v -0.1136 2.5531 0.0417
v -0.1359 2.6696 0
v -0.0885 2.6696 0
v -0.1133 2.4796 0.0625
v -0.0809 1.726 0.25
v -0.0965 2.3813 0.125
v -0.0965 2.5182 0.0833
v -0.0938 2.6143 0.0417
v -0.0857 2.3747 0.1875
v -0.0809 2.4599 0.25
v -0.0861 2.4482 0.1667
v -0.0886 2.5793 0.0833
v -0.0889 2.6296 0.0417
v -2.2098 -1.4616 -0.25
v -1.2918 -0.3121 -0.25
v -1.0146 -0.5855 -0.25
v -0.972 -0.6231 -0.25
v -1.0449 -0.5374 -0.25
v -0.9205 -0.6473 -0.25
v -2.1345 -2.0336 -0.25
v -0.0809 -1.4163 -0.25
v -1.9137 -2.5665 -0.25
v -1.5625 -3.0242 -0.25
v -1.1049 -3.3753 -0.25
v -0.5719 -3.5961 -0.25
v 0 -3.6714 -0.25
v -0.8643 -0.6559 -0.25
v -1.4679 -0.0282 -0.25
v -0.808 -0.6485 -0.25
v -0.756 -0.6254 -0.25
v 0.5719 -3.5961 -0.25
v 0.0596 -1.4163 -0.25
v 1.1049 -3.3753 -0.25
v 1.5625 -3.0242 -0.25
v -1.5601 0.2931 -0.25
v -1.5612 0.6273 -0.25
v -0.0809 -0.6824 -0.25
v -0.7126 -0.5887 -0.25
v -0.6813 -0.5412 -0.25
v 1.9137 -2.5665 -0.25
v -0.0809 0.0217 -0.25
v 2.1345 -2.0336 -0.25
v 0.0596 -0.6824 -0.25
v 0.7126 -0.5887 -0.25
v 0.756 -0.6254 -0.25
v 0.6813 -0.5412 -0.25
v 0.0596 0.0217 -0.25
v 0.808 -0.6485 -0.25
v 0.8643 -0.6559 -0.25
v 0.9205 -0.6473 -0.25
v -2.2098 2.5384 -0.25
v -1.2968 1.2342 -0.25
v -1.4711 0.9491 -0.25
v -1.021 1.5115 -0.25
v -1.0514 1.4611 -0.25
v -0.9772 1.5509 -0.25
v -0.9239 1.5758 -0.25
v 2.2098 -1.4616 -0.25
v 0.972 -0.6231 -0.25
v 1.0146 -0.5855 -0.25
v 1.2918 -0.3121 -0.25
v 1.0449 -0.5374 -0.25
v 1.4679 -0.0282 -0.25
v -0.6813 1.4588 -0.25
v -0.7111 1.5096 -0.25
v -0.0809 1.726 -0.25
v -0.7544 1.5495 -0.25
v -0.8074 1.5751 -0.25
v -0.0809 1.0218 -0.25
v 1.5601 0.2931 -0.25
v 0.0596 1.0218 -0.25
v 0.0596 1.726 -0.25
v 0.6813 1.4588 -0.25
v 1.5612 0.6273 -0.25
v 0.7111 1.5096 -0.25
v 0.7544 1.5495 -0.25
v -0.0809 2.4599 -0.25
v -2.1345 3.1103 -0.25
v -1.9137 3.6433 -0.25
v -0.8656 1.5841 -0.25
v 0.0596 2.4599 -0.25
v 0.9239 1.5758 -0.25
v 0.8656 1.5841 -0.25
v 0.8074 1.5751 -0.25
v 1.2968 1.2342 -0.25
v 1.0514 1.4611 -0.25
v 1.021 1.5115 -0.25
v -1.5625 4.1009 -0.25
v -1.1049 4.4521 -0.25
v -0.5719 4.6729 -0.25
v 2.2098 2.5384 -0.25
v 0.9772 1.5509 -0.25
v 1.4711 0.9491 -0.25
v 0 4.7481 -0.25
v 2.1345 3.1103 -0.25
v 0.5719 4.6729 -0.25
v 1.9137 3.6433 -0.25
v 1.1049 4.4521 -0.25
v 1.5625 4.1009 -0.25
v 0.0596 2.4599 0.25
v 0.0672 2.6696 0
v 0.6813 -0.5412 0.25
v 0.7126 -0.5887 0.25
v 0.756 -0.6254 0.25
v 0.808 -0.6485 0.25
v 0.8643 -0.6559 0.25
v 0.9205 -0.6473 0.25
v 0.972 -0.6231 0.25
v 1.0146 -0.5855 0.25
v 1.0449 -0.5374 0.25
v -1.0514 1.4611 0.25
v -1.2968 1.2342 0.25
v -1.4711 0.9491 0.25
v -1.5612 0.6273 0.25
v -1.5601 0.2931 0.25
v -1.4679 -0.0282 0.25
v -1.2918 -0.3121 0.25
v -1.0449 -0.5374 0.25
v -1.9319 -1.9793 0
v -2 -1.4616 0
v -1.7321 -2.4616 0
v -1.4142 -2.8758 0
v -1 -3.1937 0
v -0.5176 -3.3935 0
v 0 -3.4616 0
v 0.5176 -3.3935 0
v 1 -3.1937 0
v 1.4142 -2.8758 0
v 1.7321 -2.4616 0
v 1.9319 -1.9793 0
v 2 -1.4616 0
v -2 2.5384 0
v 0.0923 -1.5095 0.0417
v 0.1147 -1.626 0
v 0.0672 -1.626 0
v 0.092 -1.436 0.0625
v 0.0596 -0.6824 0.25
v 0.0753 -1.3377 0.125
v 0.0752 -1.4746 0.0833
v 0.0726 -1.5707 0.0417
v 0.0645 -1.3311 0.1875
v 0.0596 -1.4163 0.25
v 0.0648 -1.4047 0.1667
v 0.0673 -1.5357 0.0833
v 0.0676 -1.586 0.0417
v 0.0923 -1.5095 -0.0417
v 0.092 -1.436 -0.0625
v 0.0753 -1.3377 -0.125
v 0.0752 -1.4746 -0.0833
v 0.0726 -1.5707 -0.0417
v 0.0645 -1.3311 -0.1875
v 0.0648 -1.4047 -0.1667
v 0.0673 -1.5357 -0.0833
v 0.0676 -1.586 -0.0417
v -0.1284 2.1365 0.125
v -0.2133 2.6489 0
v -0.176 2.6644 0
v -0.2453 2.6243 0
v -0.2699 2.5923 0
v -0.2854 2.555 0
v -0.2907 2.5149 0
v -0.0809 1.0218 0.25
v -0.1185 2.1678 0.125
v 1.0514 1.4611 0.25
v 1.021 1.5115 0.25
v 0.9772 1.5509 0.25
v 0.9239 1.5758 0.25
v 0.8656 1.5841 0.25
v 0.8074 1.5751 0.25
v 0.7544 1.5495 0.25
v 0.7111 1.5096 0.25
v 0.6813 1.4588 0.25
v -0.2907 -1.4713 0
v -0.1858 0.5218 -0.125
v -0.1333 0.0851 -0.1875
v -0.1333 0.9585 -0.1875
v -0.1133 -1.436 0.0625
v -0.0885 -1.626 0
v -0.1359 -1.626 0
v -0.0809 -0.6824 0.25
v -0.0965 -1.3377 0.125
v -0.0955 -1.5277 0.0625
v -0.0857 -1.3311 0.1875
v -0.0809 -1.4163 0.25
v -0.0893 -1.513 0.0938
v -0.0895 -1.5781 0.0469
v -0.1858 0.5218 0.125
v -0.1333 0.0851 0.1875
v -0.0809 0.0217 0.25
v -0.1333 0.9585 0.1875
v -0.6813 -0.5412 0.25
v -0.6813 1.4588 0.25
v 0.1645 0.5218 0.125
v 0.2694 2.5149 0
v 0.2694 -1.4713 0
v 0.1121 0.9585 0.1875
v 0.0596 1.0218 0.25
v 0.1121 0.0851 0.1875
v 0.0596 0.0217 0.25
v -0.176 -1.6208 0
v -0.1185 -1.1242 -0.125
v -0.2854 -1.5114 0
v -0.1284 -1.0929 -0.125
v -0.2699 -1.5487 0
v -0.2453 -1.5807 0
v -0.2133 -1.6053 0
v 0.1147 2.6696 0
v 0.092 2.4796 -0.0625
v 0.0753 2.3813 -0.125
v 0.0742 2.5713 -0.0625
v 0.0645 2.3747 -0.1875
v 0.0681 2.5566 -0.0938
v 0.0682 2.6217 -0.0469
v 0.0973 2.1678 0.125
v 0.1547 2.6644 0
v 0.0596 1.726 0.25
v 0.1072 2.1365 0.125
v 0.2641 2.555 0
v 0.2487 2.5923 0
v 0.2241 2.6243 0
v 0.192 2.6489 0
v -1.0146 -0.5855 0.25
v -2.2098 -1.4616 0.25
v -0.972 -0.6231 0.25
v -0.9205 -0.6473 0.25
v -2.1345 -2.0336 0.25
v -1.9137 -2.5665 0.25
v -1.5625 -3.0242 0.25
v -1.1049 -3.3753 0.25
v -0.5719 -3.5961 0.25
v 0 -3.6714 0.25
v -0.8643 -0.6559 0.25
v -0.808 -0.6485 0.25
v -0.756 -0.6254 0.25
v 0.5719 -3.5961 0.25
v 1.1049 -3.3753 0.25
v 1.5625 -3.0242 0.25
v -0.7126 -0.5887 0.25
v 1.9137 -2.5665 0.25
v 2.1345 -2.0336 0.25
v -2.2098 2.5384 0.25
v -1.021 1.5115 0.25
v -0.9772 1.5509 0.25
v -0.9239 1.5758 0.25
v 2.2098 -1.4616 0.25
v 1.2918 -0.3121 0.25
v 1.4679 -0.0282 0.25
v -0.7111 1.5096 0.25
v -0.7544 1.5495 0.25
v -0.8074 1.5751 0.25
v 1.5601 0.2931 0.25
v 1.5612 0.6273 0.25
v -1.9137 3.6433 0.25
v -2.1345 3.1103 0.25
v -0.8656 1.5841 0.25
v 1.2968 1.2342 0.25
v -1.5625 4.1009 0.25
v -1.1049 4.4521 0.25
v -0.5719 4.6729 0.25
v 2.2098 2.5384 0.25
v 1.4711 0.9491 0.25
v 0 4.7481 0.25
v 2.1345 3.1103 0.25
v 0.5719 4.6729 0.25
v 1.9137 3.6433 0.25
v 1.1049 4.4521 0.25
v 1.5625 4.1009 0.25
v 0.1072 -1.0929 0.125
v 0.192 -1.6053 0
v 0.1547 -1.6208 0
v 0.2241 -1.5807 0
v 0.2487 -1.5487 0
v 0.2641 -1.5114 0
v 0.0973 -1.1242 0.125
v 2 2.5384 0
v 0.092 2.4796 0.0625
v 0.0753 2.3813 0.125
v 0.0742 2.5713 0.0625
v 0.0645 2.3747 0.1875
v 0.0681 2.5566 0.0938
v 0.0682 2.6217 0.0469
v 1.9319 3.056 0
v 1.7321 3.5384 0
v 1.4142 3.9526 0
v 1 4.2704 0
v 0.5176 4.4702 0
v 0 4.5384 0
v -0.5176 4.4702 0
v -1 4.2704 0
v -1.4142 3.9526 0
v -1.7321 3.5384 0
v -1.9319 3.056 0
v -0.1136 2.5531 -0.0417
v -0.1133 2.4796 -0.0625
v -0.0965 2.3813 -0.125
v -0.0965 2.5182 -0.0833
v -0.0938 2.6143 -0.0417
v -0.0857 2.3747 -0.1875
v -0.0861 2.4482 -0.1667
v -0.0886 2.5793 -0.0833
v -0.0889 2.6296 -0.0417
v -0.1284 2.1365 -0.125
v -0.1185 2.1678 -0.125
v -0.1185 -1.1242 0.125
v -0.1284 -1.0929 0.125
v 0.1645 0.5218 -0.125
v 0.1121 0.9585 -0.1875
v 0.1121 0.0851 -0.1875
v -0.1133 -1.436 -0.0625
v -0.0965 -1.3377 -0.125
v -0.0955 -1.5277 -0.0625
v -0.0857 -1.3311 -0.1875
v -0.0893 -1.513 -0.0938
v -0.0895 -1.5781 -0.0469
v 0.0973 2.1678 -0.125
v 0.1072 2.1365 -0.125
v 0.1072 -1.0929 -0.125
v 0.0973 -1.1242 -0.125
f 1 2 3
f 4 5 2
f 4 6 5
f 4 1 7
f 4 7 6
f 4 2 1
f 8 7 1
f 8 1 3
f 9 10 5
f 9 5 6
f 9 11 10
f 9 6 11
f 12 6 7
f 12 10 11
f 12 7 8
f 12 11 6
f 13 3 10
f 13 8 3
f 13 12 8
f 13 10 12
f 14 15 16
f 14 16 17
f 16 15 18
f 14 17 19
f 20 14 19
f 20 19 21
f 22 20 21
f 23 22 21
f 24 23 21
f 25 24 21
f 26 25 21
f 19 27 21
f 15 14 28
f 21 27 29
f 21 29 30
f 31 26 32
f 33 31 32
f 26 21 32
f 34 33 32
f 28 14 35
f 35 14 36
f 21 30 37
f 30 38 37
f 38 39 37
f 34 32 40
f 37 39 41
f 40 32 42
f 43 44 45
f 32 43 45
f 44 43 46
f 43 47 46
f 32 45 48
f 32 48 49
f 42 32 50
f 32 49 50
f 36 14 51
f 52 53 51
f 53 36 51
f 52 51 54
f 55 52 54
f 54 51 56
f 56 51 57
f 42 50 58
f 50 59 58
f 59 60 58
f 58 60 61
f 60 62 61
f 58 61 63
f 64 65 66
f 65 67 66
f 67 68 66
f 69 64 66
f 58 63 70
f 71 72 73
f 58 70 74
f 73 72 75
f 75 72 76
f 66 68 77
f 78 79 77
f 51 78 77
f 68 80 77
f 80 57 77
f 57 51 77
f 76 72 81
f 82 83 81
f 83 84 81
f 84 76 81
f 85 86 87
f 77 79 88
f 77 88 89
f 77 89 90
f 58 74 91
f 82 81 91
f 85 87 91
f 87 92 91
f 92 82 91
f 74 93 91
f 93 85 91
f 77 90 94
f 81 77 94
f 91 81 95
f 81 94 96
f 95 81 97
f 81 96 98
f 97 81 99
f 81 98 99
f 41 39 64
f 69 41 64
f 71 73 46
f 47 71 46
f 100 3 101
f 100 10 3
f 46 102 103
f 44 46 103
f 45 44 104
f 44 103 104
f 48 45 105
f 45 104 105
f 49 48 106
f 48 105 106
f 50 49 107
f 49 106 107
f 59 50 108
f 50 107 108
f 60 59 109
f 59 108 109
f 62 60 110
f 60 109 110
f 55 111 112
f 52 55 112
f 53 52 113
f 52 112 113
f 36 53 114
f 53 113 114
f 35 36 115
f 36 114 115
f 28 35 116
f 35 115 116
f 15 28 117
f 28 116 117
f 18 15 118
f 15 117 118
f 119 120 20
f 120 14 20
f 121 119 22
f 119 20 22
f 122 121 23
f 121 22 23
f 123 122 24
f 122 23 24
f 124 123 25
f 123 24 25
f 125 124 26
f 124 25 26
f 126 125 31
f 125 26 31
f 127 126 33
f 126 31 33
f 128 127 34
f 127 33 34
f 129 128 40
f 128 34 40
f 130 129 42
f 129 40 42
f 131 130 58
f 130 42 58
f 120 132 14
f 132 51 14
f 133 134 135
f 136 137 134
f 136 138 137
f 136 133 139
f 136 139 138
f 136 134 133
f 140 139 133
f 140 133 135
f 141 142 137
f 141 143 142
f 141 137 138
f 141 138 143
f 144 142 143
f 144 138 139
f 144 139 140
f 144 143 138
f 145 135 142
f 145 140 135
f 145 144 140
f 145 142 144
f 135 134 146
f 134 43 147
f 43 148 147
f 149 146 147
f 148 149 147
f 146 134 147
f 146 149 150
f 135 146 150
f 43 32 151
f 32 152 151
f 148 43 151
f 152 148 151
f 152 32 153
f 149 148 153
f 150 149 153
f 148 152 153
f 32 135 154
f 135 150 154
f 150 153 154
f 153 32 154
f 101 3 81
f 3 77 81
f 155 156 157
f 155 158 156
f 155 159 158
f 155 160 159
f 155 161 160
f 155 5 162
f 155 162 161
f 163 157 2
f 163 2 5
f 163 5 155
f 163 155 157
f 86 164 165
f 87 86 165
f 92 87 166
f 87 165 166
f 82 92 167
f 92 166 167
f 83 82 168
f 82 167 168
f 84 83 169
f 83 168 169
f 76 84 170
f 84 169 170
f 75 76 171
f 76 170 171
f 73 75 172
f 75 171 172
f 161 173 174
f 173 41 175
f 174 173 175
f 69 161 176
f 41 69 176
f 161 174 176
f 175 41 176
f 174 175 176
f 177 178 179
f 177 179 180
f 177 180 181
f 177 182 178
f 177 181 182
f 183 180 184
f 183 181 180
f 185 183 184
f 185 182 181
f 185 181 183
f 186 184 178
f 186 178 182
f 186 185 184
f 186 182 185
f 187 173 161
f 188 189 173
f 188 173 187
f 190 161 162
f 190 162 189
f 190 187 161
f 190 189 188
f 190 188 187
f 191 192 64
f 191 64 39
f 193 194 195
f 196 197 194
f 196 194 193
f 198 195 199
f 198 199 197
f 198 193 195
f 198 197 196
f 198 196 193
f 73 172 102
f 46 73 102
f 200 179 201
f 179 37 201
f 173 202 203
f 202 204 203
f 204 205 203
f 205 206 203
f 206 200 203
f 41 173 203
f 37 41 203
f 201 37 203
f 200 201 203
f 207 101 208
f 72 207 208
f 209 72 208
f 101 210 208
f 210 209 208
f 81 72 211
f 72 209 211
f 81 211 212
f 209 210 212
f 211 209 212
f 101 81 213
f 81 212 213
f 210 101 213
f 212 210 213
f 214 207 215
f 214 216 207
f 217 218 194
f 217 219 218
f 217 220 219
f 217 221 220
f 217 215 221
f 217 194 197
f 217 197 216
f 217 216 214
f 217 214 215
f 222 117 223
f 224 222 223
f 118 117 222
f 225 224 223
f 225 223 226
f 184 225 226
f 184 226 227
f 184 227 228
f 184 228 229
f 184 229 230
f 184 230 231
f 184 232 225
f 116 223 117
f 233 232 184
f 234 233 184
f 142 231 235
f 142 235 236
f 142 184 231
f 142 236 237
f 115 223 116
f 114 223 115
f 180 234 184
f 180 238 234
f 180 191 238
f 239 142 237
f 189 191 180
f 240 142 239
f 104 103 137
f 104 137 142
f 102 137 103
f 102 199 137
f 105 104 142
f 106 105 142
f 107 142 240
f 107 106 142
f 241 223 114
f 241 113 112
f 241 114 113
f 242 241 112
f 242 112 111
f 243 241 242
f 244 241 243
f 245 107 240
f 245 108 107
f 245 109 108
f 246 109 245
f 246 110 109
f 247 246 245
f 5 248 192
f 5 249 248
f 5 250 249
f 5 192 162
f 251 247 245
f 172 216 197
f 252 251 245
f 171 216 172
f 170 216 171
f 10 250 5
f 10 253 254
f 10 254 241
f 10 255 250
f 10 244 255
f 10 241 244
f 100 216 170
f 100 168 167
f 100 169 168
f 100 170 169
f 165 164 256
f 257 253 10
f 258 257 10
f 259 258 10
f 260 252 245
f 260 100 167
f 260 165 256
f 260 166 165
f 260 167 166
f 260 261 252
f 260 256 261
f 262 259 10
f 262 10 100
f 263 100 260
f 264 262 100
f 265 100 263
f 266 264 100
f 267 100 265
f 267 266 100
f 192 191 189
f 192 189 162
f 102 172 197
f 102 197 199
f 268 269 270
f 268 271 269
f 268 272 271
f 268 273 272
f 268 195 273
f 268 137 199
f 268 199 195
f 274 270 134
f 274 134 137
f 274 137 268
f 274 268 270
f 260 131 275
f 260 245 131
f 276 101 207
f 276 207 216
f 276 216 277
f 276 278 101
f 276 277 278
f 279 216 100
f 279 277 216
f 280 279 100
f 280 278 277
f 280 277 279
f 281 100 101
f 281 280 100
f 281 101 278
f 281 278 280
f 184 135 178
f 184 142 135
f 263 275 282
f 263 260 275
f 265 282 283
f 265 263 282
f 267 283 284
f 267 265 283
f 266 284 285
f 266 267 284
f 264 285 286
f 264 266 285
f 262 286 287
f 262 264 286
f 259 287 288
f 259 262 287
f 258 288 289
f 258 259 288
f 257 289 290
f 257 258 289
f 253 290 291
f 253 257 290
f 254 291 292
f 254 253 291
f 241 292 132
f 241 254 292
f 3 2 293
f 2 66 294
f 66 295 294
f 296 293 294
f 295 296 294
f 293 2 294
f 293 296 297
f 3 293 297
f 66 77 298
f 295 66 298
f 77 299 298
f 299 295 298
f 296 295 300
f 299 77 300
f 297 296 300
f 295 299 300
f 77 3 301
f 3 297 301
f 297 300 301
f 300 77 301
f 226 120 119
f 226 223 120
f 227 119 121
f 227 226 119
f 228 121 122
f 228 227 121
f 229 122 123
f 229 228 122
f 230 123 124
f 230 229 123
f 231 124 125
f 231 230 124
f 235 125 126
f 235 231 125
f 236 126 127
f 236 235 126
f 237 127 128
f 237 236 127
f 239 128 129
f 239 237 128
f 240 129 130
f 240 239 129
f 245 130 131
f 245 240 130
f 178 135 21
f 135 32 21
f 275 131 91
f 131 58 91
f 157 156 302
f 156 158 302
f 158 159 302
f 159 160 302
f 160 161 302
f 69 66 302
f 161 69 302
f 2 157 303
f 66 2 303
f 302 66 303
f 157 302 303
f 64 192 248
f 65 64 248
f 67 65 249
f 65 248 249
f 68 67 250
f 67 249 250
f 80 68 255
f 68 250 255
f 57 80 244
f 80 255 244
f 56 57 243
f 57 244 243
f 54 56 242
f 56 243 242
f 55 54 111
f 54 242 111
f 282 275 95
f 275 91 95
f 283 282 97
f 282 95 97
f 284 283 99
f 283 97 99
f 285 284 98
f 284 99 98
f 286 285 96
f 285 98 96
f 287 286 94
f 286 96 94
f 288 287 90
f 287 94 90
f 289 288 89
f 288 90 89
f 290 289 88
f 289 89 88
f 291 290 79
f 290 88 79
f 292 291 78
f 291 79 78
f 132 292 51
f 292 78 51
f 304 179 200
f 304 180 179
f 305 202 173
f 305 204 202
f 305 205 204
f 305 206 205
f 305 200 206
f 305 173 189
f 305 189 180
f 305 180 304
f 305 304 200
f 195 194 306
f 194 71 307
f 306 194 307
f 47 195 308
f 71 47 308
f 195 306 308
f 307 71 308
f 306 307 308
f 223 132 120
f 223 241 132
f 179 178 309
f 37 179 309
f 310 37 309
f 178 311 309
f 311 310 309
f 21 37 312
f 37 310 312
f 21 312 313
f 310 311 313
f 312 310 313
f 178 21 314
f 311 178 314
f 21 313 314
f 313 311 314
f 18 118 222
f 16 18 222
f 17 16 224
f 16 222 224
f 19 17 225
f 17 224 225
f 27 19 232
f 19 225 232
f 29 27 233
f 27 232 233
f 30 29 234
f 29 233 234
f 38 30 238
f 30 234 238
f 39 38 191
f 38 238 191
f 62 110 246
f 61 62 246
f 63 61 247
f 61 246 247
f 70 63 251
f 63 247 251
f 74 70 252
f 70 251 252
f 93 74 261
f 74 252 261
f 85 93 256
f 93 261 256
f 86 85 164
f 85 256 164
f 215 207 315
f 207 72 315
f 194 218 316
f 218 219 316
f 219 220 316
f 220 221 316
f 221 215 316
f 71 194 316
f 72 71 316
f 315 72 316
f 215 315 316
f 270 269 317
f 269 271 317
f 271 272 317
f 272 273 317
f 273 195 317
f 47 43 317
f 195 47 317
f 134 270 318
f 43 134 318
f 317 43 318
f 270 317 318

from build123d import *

# Parameters (mm, degrees)
PAD_DEPTH    = 0.25
PAD_TAPER    = -40
POCKET_DEPTH = 1


with BuildPart() as part:
    # Sketch → Pad (new body, symmetric)
    with BuildSketch(Plane.XY):
        with BuildLine():
            ThreePointArc((2, 2.538372), (0, 4.538372), (-2, 2.538372))
            Line((-2, 2.538372), (-2, -1.461628))
            ThreePointArc((-2, -1.461628), (0, -3.461628), (2, -1.461628))
            Line((2, -1.461628), (2, 2.538372))
        make_face()
        with BuildLine():
            ThreePointArc((-0.135939, 2.669636), (-0.245341, 2.62432), (-0.290657, 2.514917))
            Line((-0.290657, -1.471332), (-0.290657, 2.514917))
            ThreePointArc((-0.290657, -1.471332), (-0.245341, -1.580734), (-0.135939, -1.62605))
            Line((0.114686, -1.62605), (-0.135939, -1.62605))
            ThreePointArc((0.114686, -1.62605), (0.224088, -1.580734), (0.269404, -1.471332))
            Line((0.269404, 2.514917), (0.269404, -1.471332))
            ThreePointArc((0.269404, 2.514917), (0.224088, 2.62432), (0.114686, 2.669636))
            Line((-0.135939, 2.669636), (0.114686, 2.669636))
        make_face(mode=Mode.SUBTRACT)
    extrude(amount=PAD_DEPTH, both=True, taper=PAD_TAPER)

    # Sketch001 (on Face20 of Pad) → Pocket (cut)
    with BuildSketch(Plane.XY.offset(0.25)):
        with BuildLine():
            Line((-0.681278, 1.458789), (-0.681278, -0.541211))
            ThreePointArc((-1.044875, -0.537362), (-0.864311, -0.655939), (-0.681278, -0.541211))
            ThreePointArc((-1.051415, 1.46106), (-1.572153, 0.460134), (-1.044875, -0.537362))
            ThreePointArc((-0.681278, 1.458789), (-0.865584, 1.584104), (-1.051415, 1.46106))
        make_face()
        with BuildLine():
            Line((0.681278, 1.458789), (0.681278, -0.541211))
            ThreePointArc((0.681278, -0.541211), (0.864311, -0.655939), (1.044875, -0.537362))
            ThreePointArc((1.044875, -0.537362), (1.572153, 0.460134), (1.051415, 1.46106))
            ThreePointArc((1.051415, 1.46106), (0.865584, 1.584104), (0.681278, 1.458789))
        make_face()
    extrude(amount=-POCKET_DEPTH, mode=Mode.SUBTRACT)


solid = part.part
